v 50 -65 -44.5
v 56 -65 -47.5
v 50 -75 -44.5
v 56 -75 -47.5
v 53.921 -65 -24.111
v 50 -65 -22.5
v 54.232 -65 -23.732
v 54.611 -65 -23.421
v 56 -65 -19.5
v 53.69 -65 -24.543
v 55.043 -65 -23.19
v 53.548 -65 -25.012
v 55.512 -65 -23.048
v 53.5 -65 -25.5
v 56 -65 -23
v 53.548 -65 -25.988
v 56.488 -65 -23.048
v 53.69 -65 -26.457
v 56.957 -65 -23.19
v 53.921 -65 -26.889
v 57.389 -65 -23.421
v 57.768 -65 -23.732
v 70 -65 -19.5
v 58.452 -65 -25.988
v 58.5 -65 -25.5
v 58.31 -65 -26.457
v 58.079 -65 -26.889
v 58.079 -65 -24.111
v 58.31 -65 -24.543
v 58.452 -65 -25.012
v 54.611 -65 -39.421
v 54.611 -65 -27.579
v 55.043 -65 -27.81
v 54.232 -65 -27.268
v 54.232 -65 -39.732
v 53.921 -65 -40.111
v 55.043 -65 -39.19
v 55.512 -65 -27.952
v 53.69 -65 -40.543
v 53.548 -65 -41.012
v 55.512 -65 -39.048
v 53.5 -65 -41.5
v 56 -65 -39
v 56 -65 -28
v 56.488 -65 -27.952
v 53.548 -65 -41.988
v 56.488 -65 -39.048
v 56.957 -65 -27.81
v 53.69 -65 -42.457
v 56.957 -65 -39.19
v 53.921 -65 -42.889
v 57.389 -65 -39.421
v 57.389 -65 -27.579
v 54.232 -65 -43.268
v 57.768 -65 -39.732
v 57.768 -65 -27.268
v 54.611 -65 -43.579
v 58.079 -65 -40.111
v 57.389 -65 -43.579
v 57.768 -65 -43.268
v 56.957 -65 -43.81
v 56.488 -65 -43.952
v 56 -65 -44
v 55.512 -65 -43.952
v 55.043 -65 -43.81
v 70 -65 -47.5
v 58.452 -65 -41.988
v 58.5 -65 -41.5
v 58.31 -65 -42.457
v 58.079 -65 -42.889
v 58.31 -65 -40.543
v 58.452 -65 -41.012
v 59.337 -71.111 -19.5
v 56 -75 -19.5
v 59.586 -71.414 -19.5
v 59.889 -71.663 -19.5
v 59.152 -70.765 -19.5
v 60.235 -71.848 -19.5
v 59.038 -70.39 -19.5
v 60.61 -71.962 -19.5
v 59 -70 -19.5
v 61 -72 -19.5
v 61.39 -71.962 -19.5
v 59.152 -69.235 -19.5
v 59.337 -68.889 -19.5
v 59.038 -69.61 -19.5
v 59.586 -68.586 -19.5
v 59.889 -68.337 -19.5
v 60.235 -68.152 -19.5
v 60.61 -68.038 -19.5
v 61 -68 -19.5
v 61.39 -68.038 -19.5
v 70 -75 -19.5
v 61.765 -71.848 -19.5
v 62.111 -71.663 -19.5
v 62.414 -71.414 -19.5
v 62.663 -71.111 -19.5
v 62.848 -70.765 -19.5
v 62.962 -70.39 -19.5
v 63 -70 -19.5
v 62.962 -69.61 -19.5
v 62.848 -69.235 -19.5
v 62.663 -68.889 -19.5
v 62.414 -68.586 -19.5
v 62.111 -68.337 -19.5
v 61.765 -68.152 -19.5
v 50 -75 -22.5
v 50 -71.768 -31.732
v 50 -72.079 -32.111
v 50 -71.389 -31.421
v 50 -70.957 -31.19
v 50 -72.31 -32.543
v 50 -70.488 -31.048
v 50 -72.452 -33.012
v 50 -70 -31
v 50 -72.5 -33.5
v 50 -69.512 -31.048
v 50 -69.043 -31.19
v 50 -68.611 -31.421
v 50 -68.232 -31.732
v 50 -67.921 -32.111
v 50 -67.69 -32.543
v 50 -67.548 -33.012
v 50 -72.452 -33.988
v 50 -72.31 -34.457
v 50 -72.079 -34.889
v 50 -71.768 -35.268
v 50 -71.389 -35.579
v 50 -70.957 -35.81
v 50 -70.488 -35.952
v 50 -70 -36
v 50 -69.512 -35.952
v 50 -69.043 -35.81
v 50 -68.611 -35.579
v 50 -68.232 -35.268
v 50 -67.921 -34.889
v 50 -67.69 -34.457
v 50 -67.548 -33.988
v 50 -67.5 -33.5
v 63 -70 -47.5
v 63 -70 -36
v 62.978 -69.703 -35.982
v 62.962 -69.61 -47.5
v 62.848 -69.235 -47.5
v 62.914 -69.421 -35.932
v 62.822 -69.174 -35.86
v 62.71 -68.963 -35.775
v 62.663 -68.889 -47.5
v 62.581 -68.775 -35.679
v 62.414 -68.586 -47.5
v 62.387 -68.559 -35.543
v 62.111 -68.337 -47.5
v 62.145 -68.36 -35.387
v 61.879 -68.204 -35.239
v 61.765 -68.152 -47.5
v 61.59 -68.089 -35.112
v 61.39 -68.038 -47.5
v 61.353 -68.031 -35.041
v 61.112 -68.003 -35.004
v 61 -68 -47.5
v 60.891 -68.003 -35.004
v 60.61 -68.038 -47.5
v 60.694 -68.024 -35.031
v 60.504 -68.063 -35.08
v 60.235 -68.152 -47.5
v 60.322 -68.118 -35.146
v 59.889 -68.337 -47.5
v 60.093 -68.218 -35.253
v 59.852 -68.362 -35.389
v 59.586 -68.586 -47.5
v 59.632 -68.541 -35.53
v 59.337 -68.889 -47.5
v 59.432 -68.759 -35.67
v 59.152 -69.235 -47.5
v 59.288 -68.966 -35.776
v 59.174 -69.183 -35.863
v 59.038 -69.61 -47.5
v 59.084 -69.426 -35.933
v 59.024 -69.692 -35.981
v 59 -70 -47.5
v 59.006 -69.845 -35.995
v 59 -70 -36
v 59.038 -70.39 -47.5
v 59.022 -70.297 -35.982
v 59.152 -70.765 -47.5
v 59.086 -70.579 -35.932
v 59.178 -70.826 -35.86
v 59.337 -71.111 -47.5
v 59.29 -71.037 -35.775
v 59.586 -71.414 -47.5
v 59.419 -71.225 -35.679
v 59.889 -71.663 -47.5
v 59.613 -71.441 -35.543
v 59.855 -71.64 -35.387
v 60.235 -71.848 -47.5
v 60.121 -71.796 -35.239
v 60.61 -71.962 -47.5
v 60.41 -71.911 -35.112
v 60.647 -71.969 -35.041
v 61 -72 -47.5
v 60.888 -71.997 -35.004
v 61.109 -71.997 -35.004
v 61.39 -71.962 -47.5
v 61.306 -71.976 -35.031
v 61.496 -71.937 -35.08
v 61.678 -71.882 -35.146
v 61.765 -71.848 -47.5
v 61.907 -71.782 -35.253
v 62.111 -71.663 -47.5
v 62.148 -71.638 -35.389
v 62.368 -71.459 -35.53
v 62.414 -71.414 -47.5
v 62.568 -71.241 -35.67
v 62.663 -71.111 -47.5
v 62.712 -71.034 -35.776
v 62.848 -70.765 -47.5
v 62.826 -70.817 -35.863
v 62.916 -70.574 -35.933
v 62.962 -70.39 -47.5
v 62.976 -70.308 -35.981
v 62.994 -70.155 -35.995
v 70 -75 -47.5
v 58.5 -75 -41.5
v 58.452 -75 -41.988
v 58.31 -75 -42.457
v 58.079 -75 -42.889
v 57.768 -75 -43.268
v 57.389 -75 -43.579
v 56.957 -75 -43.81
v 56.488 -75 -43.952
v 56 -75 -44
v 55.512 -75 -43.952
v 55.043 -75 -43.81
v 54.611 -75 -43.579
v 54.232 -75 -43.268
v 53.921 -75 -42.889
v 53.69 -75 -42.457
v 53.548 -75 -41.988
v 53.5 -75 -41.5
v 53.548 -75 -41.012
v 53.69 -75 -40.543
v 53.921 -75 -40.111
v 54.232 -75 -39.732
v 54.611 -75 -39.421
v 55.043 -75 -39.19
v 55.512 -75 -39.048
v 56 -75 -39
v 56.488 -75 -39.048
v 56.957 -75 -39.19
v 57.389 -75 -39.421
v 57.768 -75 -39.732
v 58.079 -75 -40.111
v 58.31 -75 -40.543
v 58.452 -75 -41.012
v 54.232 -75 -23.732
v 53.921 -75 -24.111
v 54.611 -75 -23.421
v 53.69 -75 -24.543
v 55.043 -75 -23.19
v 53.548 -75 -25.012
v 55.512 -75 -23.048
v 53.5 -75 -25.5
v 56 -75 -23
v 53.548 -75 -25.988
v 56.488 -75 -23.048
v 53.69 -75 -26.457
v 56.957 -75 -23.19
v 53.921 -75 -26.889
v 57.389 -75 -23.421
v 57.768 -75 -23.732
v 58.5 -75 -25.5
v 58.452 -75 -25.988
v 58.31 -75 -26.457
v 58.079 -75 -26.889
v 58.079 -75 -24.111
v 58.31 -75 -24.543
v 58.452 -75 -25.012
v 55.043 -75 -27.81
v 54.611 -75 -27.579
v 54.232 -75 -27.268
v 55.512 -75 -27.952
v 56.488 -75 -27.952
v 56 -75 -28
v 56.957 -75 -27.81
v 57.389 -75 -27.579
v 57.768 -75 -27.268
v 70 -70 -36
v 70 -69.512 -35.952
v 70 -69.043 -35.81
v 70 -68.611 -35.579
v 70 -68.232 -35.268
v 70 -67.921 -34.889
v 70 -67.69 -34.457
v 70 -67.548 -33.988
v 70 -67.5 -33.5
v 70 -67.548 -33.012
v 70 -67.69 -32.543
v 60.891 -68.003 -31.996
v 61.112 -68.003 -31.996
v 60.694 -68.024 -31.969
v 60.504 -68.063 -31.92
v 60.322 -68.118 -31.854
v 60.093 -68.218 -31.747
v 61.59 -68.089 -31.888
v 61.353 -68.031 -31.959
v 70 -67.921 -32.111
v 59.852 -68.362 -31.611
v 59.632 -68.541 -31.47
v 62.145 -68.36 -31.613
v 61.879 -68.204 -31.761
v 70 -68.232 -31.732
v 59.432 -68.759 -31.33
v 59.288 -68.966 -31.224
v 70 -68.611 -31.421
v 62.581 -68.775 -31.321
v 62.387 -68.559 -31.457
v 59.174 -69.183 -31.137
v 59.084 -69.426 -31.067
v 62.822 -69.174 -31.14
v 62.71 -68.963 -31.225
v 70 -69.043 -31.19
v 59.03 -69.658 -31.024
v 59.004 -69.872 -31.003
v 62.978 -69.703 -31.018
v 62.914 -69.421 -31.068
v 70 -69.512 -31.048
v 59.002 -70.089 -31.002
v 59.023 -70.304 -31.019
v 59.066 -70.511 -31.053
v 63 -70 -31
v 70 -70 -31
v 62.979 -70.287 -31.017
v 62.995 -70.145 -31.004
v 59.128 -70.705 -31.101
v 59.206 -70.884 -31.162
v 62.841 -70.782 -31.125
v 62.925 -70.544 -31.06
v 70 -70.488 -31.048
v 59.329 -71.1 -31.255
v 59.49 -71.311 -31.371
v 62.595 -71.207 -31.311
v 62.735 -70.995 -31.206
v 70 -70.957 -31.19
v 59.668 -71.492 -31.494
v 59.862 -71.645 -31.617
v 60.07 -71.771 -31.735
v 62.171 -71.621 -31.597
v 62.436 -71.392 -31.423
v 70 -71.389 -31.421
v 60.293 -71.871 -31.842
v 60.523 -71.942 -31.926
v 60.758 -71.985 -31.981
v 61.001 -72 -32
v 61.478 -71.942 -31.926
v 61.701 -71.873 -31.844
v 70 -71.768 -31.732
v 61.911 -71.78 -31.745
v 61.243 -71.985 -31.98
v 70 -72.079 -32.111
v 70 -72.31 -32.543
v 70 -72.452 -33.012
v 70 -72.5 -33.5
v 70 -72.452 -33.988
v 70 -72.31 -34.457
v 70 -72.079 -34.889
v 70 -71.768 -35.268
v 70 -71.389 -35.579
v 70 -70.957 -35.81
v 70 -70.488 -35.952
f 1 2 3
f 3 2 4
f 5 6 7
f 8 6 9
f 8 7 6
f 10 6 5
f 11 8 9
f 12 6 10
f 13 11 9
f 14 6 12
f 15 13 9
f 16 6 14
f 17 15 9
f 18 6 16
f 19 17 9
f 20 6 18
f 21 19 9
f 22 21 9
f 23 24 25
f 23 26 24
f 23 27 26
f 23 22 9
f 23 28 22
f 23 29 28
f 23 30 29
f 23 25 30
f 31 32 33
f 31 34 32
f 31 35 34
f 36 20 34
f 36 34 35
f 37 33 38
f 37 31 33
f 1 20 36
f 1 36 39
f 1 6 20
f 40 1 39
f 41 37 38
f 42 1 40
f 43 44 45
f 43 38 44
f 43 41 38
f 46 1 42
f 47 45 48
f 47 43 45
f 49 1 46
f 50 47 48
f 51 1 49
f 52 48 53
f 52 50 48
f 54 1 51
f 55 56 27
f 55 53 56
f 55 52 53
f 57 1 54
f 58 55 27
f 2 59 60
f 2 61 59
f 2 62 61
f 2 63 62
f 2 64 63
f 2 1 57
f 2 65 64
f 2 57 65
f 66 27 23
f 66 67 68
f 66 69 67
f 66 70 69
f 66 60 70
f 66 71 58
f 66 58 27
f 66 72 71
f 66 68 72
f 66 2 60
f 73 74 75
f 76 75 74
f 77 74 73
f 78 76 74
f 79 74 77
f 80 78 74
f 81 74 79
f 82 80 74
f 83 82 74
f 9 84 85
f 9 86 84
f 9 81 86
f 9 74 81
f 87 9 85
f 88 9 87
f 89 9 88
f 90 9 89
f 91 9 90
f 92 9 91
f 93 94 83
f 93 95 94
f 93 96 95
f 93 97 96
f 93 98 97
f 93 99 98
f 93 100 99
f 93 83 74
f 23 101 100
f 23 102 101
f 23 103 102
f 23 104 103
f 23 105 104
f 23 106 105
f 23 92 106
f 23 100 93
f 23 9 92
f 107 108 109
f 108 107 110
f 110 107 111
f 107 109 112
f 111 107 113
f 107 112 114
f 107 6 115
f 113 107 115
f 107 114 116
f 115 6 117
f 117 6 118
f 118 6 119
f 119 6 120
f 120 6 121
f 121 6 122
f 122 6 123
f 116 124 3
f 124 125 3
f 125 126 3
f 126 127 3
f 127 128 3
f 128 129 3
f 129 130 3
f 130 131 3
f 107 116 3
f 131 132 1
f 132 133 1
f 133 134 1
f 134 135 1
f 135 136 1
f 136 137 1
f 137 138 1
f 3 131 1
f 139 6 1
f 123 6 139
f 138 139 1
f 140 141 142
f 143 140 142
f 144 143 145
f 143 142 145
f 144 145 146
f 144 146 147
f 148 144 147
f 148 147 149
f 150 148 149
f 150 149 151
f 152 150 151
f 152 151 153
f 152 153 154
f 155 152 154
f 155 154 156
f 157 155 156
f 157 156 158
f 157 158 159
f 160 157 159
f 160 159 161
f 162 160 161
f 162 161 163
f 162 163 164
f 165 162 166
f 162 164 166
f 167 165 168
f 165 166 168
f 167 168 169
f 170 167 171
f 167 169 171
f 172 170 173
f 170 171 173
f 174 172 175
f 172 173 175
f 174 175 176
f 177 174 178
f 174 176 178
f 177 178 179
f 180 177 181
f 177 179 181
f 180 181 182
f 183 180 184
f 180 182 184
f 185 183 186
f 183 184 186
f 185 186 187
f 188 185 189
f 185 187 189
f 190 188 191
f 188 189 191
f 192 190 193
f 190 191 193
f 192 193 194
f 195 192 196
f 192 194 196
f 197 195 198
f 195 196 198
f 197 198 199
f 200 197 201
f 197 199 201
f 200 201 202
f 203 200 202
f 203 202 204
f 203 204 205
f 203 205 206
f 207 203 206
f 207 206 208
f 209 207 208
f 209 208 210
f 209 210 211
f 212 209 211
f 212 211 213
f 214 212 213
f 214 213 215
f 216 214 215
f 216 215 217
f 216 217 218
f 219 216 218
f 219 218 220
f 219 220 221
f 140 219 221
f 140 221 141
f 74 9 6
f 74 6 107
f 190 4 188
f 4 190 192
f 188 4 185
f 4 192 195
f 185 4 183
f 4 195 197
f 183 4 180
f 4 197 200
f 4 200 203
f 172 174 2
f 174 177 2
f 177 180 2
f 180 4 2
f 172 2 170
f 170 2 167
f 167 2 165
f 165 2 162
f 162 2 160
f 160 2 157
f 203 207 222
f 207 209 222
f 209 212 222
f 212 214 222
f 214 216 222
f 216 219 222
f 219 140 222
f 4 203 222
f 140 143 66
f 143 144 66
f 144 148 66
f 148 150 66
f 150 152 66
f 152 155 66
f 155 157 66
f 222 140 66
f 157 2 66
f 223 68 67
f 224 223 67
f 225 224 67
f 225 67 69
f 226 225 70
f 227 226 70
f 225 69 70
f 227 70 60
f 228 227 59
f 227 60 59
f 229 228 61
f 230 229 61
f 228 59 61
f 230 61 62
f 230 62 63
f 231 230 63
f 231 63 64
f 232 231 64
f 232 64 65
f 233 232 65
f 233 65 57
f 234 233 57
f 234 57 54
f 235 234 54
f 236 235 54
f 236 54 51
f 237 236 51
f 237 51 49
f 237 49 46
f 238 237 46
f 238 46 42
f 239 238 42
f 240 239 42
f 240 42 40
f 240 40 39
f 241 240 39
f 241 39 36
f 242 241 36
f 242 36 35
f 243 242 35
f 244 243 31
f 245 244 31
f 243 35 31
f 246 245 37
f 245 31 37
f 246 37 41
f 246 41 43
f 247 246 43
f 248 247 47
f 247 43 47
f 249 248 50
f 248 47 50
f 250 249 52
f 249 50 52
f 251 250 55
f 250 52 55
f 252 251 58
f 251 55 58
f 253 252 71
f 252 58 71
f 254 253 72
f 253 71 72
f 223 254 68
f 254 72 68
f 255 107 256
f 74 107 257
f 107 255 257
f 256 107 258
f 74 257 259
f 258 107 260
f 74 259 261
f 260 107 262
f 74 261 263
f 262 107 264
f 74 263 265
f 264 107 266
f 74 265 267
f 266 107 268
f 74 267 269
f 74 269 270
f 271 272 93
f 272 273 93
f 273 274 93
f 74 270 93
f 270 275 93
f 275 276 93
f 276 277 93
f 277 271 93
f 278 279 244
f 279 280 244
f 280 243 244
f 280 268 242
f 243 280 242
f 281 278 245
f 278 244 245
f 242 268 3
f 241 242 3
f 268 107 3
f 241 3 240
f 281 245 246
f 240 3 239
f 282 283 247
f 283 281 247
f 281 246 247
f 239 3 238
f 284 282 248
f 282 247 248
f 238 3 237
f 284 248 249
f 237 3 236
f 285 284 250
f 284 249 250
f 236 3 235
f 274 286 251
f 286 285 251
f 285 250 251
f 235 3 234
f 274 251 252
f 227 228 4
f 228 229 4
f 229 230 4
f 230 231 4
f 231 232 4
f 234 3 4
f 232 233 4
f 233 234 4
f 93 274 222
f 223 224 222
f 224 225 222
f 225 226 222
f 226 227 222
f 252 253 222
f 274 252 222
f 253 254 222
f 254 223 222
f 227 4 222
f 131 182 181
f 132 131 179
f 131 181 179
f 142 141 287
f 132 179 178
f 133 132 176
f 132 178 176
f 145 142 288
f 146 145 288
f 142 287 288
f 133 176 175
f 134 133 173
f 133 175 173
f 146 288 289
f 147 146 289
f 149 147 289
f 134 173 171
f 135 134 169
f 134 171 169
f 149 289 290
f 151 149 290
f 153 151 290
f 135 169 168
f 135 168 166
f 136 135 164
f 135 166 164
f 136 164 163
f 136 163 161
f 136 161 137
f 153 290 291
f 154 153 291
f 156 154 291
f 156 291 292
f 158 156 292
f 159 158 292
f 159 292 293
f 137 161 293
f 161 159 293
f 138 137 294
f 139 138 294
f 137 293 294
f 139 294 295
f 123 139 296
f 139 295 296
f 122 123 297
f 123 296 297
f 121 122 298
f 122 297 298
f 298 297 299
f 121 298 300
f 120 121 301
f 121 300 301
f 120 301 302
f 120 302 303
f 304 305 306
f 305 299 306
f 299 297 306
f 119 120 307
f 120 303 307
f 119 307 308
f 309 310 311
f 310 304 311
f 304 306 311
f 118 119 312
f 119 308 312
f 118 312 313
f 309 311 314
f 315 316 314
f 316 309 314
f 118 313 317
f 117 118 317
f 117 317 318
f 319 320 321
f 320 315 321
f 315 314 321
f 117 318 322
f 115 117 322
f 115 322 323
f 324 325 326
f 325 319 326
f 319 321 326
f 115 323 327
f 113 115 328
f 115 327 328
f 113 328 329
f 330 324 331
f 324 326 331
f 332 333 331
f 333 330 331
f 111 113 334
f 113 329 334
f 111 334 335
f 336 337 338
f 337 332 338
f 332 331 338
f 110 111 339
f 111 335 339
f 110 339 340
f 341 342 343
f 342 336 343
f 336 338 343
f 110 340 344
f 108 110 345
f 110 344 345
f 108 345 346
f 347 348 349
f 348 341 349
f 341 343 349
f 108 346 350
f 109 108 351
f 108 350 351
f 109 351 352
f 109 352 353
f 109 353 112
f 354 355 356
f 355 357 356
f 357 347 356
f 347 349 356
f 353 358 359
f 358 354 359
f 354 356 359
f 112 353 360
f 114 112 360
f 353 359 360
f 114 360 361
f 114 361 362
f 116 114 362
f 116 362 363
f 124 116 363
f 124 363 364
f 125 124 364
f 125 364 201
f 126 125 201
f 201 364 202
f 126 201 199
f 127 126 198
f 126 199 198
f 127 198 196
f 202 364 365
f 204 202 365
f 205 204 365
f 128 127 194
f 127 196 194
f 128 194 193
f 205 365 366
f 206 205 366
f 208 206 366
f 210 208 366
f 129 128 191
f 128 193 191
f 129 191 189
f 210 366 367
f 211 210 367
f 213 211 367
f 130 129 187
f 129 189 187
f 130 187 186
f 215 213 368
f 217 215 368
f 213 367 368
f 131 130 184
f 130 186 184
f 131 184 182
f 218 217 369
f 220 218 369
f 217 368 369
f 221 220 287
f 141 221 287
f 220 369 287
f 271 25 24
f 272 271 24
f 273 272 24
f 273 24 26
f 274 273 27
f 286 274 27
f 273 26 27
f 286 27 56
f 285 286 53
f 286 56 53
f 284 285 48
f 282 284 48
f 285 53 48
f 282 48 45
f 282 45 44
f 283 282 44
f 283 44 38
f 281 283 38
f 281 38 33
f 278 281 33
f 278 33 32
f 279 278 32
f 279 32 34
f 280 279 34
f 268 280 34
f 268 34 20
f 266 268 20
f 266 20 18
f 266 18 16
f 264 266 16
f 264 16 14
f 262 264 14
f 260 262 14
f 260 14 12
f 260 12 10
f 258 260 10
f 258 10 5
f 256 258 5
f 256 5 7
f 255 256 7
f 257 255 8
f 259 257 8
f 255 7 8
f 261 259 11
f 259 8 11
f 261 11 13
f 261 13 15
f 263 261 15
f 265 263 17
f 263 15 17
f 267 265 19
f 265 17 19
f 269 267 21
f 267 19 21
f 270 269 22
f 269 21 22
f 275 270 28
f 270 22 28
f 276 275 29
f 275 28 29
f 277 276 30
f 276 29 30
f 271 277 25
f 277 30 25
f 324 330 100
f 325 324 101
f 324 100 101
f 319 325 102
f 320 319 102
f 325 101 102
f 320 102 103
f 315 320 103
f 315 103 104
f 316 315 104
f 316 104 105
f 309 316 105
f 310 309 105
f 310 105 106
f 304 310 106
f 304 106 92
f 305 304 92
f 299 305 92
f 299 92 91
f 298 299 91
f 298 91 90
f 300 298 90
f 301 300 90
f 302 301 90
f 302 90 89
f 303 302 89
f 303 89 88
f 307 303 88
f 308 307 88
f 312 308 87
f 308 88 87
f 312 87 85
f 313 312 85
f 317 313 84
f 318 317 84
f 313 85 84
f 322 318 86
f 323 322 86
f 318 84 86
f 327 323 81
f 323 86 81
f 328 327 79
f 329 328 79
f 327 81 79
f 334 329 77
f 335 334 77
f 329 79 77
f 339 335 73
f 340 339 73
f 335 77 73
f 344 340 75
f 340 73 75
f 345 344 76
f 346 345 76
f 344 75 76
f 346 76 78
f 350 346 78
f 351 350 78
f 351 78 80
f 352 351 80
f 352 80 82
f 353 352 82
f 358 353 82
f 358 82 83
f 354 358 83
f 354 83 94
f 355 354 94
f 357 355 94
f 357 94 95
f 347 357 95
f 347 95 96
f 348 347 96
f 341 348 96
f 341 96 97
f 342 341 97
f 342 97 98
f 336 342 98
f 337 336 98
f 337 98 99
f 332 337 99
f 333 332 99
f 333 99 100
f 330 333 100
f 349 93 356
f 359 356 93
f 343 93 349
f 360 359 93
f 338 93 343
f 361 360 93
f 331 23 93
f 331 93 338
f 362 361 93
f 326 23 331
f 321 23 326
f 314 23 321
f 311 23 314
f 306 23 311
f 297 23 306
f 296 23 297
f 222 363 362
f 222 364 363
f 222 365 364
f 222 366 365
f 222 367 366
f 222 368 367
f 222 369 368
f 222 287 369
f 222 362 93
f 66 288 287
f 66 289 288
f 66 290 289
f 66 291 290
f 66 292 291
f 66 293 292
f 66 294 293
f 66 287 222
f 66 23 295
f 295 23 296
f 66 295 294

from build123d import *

# Parameters (mm, degrees)
SKETCH_1_W                = 20.000000045
SKETCH_1_H                = 28
EXTRUDE_1_DEPTH           = 10.000000062
HOLE_WIZARD_5_0_5_1_D     = 5
HOLE_WIZARD_5_0_5_2_D     = 5
HOLE_WIZARD_4_0_4_1_D     = 4
HOLE_WIZARD_4_0_4_1_DEPTH = 40.5
CHAMFER_1_SIZE            = 3.000000071
CHAMFER_1_SIZE2           = 6.000000142


with BuildPart() as part:
    # 草图1 → 凸台-拉伸1 (new body)
    with BuildSketch(Plane(origin=(0, -65.00000108, 0), x_dir=(1, 0, 0), z_dir=(0, 1, 0))):
        with Locations((59.999999934, 33.500000026)):
            Rectangle(SKETCH_1_W, SKETCH_1_H)
    extrude(amount=-EXTRUDE_1_DEPTH)

    # Ø5.0 (5) 直径孔1 (through all)
    with Locations(Plane(origin=(0, -75.000001142, 0), x_dir=(-1, 0, 0), z_dir=(0, -1, 0))):
        with Locations((-55.999998876, 25.500000109), (-55.999998876, 41.500000109)):
            Hole(HOLE_WIZARD_5_0_5_1_D / 2)

    # Ø5.0 (5) 直径孔2 (through all)
    with Locations(Plane.ZY.offset(-49.999999911)):
        with Locations((-33.500000026, -70.000000195)):
            Hole(HOLE_WIZARD_5_0_5_2_D / 2)

    # Ø4.0 (4) 直径孔1
    with Locations(Plane(origin=(0, 0, -47.500000026), x_dir=(-1, 0, 0), z_dir=(0, 0, -1))):
        with Locations((-61, -70)):
            Hole(HOLE_WIZARD_4_0_4_1_D / 2, depth=HOLE_WIZARD_4_0_4_1_DEPTH)

    # 倒角1
    chamfer_1_edges = [part.edges().sort_by_distance(p)[0] for p in [
        (49.999999911, -70.000001111, -47.500000026),
        (49.999999911, -70.000001111, -19.500000026),
    ]]
    chamfer_1_side = [part.faces().sort_by_distance(p)[0] for p in [
        (49.999999911, -70.000001111, -47.202678651),
    ]]
    chamfer(chamfer_1_edges, length=CHAMFER_1_SIZE, length2=CHAMFER_1_SIZE2, reference=chamfer_1_side[0])


solid = part.part
